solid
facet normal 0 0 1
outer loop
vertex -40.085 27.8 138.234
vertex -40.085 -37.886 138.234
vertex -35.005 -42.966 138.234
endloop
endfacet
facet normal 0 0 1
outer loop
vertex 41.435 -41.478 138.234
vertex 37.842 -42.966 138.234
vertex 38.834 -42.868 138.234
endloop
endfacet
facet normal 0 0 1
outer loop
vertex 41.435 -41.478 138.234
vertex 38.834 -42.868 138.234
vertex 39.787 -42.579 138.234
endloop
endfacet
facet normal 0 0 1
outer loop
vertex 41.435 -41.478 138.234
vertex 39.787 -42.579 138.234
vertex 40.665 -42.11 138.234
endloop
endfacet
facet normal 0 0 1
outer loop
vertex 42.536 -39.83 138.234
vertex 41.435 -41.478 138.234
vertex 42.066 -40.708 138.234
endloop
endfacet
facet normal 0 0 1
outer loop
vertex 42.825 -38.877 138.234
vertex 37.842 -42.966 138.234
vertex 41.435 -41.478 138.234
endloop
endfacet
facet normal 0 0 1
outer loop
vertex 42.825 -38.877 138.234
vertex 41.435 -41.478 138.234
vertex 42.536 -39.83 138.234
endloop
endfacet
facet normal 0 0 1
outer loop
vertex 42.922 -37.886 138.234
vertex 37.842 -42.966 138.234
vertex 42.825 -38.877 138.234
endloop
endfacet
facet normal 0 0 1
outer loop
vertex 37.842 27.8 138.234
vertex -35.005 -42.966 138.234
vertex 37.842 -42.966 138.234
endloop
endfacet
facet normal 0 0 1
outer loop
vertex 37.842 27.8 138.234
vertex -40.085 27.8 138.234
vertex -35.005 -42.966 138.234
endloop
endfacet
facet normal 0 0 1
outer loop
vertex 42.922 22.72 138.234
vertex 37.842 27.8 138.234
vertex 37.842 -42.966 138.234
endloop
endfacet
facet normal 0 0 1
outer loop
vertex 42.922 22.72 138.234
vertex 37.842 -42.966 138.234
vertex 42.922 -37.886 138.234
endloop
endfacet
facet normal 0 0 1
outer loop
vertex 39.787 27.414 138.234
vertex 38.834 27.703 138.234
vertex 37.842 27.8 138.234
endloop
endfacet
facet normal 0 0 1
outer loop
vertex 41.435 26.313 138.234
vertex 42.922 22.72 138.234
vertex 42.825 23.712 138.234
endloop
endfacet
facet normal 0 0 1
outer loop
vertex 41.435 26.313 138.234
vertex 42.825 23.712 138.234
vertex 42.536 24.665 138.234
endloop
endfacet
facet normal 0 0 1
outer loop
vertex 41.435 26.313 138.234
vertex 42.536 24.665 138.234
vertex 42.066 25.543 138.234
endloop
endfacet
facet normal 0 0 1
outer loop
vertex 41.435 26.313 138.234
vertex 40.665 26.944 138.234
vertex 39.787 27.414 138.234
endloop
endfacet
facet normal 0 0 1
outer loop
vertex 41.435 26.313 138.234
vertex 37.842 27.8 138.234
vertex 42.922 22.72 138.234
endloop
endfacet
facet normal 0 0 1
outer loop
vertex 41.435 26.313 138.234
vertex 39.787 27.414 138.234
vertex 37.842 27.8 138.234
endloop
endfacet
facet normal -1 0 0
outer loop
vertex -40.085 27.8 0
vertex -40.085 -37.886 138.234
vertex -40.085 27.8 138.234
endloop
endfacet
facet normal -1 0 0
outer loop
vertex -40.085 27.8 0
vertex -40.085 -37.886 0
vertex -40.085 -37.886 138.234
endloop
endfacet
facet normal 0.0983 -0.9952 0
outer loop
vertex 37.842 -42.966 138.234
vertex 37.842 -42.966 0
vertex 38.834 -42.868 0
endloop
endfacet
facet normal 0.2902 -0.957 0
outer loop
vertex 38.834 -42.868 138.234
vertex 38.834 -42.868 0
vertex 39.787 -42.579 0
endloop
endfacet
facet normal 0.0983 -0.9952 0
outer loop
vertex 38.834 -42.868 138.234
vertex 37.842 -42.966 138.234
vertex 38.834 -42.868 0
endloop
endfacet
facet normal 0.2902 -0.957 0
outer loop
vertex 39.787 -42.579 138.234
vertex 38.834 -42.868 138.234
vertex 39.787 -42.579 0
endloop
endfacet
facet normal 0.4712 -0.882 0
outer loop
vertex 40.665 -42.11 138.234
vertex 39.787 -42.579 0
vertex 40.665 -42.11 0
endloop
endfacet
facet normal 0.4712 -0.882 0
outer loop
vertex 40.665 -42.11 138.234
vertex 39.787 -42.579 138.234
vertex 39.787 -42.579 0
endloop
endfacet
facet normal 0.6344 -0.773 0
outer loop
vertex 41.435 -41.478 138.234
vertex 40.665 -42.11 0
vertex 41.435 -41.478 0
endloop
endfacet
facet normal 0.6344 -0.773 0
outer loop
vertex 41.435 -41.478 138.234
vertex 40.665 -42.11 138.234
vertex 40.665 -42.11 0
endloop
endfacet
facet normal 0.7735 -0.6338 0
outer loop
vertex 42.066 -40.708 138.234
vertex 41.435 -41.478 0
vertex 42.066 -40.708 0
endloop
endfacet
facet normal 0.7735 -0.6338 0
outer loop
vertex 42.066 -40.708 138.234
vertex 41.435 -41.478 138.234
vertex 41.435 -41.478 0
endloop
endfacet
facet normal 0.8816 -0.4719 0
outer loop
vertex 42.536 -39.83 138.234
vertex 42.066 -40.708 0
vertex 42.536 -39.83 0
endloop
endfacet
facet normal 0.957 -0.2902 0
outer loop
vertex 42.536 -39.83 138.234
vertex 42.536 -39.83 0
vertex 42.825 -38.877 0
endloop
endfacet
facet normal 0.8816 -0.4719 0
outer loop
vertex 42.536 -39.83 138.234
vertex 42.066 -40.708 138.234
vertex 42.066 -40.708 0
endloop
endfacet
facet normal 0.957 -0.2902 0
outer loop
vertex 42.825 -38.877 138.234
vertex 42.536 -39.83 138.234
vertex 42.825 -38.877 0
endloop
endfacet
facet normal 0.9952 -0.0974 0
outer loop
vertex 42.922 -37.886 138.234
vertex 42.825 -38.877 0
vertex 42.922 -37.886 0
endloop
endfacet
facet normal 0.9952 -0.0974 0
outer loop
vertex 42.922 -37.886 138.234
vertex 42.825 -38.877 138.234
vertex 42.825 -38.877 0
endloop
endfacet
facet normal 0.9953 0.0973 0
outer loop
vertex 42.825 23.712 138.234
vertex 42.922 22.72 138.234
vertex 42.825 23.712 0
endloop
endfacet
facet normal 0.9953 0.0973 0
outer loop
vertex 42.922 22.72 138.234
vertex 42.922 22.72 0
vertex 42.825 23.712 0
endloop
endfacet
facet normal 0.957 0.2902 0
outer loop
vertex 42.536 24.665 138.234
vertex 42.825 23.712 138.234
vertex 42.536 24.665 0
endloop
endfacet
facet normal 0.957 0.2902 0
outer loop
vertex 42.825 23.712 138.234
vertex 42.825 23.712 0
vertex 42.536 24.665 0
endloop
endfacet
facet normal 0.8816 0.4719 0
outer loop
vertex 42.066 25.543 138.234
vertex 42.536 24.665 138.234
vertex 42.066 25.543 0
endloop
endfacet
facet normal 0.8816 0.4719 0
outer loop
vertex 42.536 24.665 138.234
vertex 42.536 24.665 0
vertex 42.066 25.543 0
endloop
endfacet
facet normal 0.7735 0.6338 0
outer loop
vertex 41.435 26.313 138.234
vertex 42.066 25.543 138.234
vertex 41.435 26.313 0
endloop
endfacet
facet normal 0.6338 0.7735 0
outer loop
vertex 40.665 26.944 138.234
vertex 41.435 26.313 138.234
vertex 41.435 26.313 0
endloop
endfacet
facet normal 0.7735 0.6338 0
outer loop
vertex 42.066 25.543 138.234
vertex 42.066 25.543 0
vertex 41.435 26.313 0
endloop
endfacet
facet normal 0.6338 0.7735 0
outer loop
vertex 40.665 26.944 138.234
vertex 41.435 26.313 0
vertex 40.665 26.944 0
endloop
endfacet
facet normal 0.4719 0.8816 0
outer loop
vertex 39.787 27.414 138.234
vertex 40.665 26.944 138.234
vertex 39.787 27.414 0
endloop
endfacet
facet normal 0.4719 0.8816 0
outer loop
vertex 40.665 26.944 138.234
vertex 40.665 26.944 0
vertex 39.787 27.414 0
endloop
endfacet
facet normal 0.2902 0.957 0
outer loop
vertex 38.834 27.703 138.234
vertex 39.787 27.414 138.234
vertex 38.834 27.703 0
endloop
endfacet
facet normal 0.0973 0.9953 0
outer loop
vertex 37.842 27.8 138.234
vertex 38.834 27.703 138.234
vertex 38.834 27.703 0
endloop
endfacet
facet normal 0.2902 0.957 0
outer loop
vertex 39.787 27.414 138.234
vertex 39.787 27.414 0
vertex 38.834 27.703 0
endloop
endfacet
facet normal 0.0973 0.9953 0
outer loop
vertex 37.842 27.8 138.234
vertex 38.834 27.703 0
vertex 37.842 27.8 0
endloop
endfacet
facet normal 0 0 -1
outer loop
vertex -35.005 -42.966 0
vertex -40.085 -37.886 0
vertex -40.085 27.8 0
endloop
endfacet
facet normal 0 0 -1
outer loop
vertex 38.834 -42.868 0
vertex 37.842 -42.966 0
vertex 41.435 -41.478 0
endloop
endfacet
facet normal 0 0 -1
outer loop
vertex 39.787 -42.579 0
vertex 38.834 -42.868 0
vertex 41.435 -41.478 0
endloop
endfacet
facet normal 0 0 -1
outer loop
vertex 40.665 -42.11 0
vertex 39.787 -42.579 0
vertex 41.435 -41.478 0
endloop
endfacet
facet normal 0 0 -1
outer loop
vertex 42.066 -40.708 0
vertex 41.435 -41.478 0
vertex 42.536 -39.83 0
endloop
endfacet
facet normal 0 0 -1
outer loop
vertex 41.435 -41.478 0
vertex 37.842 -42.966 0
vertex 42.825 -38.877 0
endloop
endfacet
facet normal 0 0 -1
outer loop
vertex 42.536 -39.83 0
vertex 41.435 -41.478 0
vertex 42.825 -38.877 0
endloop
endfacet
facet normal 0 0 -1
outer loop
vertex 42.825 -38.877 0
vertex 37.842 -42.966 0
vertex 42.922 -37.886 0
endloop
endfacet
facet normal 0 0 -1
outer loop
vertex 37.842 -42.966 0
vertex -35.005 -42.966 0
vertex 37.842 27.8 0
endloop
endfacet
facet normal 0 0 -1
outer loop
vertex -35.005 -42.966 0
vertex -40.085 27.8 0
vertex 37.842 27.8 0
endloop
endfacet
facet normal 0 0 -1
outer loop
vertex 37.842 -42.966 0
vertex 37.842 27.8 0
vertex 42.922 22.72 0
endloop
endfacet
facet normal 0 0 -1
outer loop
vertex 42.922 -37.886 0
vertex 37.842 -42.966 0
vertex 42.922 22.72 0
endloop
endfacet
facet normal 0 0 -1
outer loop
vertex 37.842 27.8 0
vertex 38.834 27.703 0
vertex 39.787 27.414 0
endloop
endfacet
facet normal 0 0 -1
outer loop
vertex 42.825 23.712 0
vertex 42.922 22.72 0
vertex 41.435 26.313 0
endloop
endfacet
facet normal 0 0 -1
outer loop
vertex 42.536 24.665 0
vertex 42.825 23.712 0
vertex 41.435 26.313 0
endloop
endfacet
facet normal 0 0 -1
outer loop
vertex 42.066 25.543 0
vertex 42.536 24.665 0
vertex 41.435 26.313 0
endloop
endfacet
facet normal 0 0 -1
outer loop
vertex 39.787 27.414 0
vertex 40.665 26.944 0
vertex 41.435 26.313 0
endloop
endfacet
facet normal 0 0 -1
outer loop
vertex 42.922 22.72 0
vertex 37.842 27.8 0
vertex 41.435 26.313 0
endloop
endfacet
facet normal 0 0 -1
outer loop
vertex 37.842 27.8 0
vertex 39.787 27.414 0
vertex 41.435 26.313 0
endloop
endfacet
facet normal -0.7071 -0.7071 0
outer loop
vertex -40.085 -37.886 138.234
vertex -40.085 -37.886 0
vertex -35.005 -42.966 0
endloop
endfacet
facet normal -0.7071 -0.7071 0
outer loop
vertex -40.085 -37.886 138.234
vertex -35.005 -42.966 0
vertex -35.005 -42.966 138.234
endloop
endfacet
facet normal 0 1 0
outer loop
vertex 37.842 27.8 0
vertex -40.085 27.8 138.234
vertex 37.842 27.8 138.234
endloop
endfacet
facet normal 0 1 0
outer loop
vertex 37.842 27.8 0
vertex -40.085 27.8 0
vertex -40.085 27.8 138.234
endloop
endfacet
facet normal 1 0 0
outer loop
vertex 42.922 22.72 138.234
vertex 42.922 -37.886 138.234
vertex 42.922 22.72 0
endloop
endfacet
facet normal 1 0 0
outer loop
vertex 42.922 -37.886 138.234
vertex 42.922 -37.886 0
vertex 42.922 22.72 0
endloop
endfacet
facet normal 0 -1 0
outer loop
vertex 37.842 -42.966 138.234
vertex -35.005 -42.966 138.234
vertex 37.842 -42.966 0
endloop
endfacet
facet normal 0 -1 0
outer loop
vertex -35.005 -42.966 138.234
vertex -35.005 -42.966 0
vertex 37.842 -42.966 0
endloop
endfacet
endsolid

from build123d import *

# Parameters (mm, degrees)
F0_W     = 83.0075256526
F0_H     = 70.7665830851
F1_DEPTH = 25.4
F2_W     = 83.0075256526
F2_H     = 70.7665830851
F3_DEPTH = 112.8343343735
F4_R     = 5.08
F5_SIZE  = 5.08


with BuildPart() as f1:
    # F0 (on Top) → F1 (new body)
    with BuildSketch(Plane.XY):
        with Locations((1.4187190682, -7.5828060508)):
            Rectangle(F0_W, F0_H)
    extrude(amount=F1_DEPTH)

    # F2 (on face) → F3 (join)
    with BuildSketch(Plane.XY.offset(25.4)):
        with Locations((1.4187190682, -7.5828060508)):
            Rectangle(F2_W, F2_H)
    extrude(amount=F3_DEPTH)

    # F4
    f4_edges = [f1.edges().sort_by_distance(p)[0] for p in [
        (42.922482, -42.966098, 69.117167),
        (42.922482, 27.800485, 69.117167),
    ]]
    fillet(f4_edges, radius=F4_R)

    # F5
    f5_edges = [f1.edges().sort_by_distance(p)[0] for p in [
        (-40.085044, -42.966098, 69.117167),
    ]]
    chamfer(f5_edges, length=F5_SIZE)


solid = f1.part
